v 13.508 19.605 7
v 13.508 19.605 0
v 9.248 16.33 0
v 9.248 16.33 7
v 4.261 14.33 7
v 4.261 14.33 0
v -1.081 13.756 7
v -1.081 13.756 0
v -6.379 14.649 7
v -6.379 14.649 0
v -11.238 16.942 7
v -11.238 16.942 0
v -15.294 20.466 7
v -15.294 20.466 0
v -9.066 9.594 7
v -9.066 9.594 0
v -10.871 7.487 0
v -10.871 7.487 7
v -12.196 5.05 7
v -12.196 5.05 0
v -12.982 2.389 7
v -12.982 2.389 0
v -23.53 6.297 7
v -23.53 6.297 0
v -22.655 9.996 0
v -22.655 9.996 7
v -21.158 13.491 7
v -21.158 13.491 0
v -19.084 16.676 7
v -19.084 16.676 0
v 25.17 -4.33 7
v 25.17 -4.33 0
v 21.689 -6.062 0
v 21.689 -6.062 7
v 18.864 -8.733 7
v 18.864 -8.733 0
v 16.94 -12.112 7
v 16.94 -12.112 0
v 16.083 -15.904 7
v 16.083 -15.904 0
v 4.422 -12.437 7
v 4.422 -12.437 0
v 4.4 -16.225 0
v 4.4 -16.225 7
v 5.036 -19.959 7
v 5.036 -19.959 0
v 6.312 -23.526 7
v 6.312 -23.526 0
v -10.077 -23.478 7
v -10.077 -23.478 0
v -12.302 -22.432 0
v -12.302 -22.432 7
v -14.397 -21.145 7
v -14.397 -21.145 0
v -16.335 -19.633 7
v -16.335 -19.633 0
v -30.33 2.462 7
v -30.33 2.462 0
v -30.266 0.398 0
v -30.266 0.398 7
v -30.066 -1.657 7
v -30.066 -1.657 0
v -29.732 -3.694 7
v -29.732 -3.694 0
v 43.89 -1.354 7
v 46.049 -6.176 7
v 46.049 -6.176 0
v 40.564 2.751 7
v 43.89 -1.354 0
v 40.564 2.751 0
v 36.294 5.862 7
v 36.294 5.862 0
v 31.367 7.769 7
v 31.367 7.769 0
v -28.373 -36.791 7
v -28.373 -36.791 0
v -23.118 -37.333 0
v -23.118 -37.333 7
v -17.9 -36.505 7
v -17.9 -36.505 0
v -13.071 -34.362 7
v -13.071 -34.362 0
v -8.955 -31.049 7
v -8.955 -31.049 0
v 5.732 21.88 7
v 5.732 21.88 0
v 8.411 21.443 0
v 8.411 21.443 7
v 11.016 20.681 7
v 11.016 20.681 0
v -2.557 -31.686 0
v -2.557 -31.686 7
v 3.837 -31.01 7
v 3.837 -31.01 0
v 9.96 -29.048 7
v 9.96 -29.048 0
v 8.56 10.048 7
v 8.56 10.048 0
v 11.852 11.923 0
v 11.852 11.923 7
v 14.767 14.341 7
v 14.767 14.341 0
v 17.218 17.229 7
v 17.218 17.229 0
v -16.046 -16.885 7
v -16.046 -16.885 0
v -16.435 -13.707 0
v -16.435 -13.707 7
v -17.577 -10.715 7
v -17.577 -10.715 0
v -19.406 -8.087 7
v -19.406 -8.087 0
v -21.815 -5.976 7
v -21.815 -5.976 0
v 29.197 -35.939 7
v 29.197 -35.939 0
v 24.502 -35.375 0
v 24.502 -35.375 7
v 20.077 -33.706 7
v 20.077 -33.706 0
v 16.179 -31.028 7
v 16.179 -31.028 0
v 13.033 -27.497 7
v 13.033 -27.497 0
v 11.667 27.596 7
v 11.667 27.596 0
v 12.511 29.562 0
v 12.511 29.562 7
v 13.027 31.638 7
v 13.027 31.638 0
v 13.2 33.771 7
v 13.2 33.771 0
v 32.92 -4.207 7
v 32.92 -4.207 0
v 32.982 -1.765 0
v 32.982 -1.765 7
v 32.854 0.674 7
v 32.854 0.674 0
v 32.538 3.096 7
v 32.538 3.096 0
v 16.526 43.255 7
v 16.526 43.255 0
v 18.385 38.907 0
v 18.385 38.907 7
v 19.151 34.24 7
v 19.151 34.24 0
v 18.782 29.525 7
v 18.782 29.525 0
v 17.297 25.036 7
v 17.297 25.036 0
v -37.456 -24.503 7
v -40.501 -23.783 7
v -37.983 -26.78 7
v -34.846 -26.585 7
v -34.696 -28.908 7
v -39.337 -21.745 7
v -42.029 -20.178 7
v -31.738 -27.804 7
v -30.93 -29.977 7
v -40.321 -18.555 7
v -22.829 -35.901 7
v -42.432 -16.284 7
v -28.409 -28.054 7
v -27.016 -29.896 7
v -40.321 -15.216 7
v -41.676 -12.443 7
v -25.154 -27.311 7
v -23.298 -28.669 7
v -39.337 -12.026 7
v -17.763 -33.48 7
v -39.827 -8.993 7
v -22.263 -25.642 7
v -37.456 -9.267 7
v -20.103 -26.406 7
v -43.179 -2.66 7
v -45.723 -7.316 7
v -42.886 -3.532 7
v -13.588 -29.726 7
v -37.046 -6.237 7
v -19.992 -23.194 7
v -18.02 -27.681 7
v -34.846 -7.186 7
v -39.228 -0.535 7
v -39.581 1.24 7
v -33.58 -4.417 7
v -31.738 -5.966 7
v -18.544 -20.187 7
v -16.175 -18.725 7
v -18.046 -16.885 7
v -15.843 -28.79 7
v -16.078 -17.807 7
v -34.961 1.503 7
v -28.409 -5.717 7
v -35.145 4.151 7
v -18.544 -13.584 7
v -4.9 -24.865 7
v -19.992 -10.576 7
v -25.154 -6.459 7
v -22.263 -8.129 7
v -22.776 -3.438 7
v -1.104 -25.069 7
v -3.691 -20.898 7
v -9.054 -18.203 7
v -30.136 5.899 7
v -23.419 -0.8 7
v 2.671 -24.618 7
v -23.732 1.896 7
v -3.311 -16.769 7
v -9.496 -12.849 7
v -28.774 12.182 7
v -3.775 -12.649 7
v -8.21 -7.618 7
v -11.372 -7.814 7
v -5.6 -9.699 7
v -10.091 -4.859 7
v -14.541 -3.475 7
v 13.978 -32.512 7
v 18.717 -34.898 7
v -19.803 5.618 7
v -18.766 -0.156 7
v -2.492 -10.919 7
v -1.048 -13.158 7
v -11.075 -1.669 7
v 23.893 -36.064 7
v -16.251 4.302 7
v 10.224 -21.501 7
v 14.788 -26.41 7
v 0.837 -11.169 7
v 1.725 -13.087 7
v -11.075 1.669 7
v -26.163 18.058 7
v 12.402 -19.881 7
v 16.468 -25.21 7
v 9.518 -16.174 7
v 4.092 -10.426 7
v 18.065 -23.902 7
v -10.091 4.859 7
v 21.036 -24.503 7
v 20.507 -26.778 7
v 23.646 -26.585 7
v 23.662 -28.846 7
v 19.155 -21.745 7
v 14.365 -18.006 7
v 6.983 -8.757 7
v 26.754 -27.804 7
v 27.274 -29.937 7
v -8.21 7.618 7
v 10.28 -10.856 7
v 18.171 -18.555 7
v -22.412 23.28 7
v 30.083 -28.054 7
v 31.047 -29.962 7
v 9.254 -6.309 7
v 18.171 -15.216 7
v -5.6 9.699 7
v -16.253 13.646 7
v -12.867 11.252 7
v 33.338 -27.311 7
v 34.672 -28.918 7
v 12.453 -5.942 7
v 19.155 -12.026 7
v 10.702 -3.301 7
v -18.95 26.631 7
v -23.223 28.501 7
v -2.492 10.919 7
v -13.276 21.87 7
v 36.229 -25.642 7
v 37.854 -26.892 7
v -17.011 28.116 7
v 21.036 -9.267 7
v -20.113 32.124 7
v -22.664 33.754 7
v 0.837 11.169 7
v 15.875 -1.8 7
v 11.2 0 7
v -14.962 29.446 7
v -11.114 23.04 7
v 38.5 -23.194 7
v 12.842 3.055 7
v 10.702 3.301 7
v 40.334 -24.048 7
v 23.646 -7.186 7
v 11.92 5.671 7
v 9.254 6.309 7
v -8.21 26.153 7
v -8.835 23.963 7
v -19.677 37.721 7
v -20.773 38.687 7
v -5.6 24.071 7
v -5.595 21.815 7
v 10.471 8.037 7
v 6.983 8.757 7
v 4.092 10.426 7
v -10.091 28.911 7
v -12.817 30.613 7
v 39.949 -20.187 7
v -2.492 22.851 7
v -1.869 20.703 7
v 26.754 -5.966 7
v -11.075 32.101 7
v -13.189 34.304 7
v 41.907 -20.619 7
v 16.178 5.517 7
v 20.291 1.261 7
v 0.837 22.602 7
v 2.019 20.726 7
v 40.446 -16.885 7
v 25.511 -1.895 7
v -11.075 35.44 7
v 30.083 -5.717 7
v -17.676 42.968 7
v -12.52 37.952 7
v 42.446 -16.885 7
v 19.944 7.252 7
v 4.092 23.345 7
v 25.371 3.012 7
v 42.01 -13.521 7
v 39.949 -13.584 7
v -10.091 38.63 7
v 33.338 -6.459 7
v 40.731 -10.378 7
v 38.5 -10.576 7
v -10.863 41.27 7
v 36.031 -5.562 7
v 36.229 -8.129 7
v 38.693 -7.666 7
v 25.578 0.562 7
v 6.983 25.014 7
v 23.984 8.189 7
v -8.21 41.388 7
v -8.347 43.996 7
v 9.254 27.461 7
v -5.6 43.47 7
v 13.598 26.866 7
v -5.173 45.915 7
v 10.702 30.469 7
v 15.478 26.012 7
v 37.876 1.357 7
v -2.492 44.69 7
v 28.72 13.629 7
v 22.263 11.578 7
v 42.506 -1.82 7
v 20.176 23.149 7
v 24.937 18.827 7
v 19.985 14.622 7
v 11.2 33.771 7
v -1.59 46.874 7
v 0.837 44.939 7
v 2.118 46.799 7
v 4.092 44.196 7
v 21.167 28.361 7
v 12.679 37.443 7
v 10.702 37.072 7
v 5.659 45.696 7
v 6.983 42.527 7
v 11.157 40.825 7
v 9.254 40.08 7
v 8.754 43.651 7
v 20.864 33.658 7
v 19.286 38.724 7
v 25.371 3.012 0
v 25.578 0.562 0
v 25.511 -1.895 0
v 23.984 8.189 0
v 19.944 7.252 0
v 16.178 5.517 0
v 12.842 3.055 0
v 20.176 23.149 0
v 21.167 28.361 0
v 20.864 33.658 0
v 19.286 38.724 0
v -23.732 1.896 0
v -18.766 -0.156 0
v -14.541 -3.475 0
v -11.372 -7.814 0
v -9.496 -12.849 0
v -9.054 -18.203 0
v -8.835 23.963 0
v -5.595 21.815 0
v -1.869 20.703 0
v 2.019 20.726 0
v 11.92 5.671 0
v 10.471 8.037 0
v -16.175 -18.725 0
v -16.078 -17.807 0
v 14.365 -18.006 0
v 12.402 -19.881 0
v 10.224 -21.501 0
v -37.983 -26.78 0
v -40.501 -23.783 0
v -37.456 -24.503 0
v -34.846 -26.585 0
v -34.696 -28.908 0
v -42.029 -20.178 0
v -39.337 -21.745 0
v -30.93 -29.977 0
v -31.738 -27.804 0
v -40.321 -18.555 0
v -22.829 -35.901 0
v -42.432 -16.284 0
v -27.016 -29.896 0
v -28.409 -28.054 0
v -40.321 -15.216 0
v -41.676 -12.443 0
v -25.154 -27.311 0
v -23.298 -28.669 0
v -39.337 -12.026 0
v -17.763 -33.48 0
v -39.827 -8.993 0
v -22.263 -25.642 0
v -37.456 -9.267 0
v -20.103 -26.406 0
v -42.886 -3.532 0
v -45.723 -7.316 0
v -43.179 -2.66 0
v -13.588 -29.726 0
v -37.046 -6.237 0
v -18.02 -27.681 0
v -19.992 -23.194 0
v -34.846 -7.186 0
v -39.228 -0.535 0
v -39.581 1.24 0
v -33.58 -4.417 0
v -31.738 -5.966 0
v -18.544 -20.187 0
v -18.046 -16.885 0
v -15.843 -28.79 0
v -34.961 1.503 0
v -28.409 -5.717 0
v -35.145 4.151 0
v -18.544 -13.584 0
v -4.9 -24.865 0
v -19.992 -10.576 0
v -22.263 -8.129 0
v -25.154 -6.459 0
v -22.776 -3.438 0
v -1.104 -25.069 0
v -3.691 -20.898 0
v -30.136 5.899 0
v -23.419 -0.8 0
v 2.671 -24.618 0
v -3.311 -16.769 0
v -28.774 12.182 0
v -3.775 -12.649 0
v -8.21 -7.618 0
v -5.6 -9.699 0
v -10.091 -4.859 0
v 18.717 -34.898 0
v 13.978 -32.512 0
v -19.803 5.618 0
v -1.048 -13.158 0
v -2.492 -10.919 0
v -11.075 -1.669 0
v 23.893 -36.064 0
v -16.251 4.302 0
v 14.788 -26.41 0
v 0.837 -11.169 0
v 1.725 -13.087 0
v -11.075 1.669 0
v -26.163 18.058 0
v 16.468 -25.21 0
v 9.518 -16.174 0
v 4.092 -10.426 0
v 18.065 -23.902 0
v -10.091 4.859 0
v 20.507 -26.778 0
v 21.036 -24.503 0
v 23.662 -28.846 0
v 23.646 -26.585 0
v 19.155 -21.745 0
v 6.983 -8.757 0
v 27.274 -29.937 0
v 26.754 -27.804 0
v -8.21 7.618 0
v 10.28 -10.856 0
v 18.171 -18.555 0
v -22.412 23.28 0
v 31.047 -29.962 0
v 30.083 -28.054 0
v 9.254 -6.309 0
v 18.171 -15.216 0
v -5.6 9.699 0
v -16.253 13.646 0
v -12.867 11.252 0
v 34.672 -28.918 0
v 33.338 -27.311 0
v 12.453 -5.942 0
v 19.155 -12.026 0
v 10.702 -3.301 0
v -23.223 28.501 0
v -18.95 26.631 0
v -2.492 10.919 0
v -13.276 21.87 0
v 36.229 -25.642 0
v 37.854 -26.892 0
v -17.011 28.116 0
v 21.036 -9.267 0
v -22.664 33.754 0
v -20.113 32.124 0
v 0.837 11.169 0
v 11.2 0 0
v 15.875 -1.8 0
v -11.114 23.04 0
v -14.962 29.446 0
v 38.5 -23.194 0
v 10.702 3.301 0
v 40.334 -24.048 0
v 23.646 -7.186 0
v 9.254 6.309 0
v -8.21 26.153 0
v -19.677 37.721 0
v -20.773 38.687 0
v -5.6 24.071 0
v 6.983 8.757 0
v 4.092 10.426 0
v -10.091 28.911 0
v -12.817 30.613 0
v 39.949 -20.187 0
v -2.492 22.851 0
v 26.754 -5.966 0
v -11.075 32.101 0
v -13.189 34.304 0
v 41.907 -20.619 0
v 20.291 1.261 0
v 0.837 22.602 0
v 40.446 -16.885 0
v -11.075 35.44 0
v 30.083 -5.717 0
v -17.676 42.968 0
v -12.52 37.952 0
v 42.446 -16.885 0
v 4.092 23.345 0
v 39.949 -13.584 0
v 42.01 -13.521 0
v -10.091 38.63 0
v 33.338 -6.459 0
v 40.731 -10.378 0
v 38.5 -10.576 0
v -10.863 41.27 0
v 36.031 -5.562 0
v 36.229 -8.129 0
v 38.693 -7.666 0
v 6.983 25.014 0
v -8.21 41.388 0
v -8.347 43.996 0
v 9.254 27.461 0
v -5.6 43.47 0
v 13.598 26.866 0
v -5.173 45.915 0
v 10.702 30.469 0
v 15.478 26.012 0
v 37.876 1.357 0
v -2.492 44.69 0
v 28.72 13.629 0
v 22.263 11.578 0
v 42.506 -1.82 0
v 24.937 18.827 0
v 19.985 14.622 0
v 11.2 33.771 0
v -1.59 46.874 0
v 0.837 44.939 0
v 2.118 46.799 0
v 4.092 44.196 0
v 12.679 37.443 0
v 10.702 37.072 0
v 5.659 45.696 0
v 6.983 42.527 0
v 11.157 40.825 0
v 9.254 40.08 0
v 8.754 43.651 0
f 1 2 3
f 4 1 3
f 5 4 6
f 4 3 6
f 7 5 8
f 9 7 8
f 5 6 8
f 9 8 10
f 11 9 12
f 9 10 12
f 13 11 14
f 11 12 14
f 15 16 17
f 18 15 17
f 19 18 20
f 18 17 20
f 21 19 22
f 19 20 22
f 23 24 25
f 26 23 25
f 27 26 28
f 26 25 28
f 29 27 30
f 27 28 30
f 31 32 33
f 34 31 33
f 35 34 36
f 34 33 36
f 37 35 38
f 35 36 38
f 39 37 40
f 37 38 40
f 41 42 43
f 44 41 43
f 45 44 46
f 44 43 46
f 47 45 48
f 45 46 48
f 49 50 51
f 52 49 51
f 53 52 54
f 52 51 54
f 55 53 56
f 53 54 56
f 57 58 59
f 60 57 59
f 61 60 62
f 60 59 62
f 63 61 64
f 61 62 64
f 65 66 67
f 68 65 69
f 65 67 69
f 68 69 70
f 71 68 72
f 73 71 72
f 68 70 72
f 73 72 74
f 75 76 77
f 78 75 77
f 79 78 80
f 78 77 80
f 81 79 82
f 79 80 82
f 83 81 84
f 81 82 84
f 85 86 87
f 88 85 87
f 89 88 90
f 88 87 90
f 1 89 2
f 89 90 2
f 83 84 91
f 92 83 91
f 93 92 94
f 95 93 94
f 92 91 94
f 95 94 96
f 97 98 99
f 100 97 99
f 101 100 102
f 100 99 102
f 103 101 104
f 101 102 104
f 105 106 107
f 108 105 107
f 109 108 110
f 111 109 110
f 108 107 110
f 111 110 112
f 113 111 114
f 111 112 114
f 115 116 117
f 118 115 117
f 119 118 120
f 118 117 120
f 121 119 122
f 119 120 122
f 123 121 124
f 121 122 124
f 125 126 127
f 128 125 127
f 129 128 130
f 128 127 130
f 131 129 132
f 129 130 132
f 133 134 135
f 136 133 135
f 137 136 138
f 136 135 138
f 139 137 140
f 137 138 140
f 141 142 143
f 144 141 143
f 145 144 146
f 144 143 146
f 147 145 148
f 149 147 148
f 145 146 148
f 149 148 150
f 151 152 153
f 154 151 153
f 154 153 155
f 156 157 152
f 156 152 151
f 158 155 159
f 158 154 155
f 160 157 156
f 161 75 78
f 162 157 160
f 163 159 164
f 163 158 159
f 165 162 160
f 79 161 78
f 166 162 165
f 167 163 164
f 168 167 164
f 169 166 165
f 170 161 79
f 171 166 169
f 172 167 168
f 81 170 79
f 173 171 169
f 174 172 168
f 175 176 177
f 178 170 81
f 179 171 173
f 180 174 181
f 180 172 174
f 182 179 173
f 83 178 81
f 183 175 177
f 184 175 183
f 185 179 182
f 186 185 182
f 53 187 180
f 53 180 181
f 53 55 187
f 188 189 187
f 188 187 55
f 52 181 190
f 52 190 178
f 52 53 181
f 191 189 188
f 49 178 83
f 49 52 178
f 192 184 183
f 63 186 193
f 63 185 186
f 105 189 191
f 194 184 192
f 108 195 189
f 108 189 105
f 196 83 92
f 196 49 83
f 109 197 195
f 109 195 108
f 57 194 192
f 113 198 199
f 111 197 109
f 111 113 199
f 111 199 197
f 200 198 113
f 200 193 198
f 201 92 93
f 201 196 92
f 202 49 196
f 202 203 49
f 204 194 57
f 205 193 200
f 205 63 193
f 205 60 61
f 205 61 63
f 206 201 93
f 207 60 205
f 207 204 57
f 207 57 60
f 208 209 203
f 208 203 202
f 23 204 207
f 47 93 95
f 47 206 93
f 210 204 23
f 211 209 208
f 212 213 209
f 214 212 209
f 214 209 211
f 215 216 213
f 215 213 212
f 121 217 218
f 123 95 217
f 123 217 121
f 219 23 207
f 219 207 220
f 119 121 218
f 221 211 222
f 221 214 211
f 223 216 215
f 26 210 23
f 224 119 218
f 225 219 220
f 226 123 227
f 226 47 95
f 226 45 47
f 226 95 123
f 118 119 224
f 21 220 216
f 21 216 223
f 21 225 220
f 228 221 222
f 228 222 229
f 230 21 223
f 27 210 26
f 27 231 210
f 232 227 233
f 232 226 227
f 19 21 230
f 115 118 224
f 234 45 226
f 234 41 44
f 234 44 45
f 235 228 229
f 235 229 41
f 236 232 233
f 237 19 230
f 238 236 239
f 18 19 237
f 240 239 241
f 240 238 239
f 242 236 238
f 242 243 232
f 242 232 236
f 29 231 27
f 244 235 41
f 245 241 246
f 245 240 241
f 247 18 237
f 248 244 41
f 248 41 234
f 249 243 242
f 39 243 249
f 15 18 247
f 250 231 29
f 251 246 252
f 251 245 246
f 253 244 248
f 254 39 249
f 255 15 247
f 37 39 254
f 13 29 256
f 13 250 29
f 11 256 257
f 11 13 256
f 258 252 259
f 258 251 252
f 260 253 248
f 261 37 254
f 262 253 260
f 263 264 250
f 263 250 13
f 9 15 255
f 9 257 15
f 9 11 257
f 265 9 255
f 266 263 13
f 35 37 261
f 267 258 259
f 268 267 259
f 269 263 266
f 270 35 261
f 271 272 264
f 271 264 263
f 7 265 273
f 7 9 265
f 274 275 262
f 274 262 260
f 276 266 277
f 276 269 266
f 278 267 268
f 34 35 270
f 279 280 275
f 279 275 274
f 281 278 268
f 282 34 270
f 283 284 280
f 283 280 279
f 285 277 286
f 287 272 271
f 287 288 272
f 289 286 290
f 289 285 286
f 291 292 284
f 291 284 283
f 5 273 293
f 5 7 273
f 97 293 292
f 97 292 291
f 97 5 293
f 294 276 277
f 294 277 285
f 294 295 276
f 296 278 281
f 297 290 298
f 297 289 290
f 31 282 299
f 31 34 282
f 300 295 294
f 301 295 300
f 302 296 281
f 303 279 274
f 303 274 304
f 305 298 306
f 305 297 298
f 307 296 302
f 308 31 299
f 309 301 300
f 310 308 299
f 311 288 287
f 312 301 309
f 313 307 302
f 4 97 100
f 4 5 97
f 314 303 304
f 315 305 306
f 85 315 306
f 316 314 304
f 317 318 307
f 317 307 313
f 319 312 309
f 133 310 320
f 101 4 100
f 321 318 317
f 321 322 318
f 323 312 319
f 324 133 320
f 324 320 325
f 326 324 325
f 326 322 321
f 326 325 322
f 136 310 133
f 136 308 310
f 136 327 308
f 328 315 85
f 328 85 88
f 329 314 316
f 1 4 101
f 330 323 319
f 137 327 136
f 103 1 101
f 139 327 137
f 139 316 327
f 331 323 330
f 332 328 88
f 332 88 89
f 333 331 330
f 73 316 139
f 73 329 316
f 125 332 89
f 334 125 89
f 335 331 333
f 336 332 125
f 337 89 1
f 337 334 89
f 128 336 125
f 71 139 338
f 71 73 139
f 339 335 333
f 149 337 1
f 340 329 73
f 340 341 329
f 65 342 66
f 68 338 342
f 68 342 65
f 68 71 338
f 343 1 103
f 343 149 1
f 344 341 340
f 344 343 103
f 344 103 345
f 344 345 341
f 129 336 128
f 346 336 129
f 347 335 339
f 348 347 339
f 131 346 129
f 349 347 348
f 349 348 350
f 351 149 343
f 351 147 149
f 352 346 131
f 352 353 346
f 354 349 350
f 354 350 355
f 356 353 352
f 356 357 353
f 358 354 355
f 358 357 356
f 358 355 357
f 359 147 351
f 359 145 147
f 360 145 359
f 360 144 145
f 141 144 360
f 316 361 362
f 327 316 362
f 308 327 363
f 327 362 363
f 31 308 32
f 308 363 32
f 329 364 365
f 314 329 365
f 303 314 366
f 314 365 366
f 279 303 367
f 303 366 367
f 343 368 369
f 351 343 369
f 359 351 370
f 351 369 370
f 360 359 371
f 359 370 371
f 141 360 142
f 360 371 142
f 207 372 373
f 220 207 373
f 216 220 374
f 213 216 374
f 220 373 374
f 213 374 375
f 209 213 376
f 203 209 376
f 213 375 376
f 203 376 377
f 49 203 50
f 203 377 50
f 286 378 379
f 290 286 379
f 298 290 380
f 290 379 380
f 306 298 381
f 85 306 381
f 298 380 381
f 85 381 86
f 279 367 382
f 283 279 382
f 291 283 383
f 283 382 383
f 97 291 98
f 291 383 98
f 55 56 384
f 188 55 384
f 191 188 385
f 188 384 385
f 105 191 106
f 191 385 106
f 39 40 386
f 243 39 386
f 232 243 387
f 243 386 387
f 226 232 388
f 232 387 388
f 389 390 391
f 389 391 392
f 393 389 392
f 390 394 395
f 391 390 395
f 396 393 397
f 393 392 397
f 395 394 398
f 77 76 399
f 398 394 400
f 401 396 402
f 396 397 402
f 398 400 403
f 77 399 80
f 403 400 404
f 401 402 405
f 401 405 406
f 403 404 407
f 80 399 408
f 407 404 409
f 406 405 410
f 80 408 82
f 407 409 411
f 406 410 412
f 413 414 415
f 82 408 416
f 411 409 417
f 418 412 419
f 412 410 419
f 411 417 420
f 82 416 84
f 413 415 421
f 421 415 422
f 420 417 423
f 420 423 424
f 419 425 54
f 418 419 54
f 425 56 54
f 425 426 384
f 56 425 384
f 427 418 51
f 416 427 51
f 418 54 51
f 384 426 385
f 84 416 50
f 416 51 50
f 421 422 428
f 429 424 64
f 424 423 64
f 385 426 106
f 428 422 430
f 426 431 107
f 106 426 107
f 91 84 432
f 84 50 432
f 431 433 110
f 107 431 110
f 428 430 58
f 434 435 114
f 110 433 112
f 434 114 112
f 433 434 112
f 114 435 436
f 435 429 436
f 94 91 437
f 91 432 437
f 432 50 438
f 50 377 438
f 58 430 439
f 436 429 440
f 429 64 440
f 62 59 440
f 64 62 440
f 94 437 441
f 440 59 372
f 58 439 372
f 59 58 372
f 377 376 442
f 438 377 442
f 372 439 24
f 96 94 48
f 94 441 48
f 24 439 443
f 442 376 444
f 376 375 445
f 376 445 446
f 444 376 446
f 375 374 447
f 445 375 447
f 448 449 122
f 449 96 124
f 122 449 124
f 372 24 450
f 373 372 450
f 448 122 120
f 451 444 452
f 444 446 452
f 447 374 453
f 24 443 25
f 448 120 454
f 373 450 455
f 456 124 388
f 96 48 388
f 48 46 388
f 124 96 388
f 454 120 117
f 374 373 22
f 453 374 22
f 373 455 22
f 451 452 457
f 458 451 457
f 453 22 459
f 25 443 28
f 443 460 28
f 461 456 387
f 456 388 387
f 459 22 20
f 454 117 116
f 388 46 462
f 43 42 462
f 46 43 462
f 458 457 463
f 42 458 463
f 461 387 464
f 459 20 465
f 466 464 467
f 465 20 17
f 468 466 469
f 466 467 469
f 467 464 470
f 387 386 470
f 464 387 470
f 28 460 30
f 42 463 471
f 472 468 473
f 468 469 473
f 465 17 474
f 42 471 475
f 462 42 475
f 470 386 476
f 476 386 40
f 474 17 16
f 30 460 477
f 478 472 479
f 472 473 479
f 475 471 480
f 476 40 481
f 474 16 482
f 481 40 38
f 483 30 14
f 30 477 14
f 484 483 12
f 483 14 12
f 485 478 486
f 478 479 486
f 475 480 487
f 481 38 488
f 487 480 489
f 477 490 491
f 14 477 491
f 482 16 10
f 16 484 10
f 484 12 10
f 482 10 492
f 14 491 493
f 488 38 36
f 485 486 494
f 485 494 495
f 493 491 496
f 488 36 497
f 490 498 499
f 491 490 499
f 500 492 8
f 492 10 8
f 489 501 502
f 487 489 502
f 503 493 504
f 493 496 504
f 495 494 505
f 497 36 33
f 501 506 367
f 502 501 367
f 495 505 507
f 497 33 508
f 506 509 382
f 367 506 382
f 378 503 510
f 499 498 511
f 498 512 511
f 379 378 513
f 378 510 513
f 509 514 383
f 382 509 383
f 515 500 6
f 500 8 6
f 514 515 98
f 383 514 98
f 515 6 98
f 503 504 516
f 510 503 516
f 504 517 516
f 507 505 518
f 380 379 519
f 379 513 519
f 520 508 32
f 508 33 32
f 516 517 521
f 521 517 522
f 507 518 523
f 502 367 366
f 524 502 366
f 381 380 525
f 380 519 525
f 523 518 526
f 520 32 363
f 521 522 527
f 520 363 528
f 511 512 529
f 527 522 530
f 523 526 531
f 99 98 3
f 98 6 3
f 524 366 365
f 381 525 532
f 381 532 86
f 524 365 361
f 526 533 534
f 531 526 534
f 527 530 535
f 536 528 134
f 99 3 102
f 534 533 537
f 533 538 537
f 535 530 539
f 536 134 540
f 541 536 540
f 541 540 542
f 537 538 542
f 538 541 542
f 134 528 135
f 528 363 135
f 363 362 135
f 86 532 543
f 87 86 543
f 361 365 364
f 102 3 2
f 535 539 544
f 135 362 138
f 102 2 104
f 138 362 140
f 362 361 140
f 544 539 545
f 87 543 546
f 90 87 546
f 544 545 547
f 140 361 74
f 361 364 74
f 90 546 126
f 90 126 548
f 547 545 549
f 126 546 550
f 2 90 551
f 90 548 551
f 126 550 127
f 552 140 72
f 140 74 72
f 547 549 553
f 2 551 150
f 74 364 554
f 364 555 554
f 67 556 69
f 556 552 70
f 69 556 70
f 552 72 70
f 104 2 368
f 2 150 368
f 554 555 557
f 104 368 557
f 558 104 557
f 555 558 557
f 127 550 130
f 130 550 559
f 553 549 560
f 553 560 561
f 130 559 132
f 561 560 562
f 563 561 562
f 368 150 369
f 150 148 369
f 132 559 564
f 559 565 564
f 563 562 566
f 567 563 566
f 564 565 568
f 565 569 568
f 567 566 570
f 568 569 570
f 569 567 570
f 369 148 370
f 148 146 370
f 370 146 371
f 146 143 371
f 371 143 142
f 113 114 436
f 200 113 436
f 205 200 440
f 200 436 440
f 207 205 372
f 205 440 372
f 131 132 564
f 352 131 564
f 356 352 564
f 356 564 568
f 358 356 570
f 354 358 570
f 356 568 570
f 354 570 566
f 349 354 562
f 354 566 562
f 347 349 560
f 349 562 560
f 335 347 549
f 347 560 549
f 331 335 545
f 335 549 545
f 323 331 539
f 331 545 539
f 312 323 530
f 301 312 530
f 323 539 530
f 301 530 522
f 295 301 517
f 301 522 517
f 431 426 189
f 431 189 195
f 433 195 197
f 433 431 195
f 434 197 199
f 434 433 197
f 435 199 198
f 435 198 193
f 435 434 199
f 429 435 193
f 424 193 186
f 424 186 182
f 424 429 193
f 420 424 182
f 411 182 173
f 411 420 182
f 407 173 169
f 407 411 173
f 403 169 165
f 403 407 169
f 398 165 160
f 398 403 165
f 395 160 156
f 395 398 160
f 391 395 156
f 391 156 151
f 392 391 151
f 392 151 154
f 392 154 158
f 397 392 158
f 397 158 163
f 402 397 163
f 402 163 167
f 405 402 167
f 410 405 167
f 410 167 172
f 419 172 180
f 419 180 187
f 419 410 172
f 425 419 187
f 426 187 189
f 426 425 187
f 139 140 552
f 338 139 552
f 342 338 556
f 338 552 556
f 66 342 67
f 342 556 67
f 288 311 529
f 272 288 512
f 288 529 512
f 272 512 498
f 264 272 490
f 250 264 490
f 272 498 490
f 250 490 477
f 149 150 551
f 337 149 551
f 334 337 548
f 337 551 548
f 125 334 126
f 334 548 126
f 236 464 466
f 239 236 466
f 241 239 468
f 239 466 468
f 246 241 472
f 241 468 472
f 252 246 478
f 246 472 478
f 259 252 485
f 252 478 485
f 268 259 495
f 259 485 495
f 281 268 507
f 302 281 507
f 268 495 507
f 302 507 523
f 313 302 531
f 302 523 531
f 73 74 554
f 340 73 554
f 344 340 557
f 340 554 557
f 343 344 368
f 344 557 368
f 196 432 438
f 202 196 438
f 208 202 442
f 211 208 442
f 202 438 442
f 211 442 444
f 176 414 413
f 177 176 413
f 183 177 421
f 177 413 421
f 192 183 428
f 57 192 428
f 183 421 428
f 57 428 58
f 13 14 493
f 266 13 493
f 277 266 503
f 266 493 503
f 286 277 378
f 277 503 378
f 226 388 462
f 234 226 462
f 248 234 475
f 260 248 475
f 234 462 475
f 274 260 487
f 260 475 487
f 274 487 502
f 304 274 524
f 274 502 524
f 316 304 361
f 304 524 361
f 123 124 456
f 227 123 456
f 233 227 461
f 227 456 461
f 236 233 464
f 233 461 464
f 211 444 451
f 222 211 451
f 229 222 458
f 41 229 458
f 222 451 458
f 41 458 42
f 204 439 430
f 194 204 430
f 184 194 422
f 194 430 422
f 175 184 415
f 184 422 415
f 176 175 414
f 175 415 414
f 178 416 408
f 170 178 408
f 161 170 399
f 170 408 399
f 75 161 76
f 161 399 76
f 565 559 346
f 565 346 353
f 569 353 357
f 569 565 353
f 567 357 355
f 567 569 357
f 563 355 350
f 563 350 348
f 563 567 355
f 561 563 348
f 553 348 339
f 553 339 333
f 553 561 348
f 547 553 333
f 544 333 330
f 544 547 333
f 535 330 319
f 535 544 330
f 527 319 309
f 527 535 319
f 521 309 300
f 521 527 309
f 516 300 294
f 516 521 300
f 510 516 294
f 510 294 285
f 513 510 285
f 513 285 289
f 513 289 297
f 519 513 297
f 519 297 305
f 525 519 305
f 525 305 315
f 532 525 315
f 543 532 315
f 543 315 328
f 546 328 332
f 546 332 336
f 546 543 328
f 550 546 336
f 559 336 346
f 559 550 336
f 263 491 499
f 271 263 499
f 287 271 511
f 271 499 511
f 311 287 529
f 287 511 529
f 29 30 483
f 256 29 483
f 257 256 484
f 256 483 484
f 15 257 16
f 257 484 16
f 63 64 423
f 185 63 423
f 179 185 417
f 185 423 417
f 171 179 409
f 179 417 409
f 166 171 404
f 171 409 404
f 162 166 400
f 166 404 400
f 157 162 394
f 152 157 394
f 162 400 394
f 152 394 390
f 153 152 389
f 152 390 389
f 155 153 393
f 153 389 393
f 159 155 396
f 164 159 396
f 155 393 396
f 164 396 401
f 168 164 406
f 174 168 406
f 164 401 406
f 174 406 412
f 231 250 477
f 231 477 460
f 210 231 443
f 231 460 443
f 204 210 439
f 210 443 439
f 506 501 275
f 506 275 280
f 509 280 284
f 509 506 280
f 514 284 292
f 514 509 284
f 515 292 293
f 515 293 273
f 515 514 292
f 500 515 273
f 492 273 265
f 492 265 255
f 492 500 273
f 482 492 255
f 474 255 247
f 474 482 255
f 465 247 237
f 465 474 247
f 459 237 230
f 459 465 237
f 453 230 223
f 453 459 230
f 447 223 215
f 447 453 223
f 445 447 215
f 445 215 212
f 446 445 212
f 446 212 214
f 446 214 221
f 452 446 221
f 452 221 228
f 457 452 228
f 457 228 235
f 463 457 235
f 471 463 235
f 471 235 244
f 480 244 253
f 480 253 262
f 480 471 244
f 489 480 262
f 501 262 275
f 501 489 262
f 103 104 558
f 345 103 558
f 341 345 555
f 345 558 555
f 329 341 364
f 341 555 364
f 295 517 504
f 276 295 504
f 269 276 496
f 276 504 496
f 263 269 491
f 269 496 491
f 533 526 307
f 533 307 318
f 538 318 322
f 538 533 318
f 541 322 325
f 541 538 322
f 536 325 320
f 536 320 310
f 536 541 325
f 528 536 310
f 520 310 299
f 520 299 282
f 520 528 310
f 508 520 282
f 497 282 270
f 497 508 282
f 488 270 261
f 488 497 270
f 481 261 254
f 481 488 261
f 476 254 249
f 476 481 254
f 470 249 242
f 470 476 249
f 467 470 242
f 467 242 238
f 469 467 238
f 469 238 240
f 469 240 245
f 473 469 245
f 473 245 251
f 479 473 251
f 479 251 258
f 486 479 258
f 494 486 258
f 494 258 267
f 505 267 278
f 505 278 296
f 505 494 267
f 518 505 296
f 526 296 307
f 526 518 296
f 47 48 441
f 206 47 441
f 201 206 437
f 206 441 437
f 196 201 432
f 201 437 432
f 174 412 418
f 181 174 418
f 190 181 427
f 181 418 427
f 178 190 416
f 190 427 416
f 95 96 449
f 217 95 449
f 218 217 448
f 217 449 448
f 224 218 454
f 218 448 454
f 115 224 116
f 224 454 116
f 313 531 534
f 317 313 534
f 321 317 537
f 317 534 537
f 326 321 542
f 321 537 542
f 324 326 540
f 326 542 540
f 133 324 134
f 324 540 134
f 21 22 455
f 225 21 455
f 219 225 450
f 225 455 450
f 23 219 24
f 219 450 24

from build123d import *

# Parameters (mm, degrees)
F0_R     = 11.2
F1_DEPTH = 7


with BuildPart() as f1:
    # F0 (on Top) → F1 (new body)
    with BuildSketch(Plane.XY):
        with BuildLine():
            ThreePointArc((-9.0664544139, 9.593716921), (-0.3402026464, 13.1956152626), (8.5600576622, 10.0481546973))
            ThreePointArc((8.5600576622, 10.0481546973), (13.3623688649, 13.0682272047), (17.2184018315, 17.229241576))
            ThreePointArc((17.2184018315, 17.229241576), (15.4226648447, 18.5097823264), (13.5080117048, 19.6045696542))
            ThreePointArc((13.5080117048, 19.6045696542), (-1.0807969762, 13.7556794158), (-15.2941767487, 20.4655744367))
            ThreePointArc((-15.2941767487, 20.4655744367), (-17.3044688505, 18.6863680779), (-19.0837069005, 16.676104025))
            ThreePointArc((-19.0837069005, 16.676104025), (-14.6210833504, 12.36265011), (-9.0664544139, 9.593716921))
        make_face()
        with BuildLine():
            ThreePointArc((12.8416297773, 3.0549213841), (13.1101013165, 1.5379348068), (13.2, 0))
            ThreePointArc((13.2, 0), (10.7844669514, -7.6115223559), (4.4219283979, -12.4373047419))
            ThreePointArc((4.4219283979, -12.4373047419), (4.6362323092, -18.1062644941), (6.311759977, -23.5261941867))
            ThreePointArc((6.311759977, -23.5261941867), (8.3186092908, -22.6113107128), (10.2240494984, -21.5005661181))
            ThreePointArc((10.2240494984, -21.5005661181), (12.4531663085, -5.9418420702), (25.3707957396, 3.012358376))
            ThreePointArc((25.3707957396, 3.012358376), (24.8351038852, 5.6429255846), (23.983783172, 8.1889229618))
            ThreePointArc((23.983783172, 8.1889229618), (18.0169107285, 6.4809045573), (12.8416297773, 3.0549213841))
        make_face()
        with BuildLine():
            ThreePointArc((-4.9000762715, -24.8650269867), (-3.3958273782, -18.8435546673), (-3.7751753634, -12.6486383052))
            ThreePointArc((-3.7751753634, -12.6486383052), (-11.2576367128, -6.8924317656), (-12.9819860601, 2.3891500447))
            ThreePointArc((-12.9819860601, 2.3891500447), (-17.9986011741, 5.0380372894), (-23.5301618085, 6.2969526107))
            ThreePointArc((-23.5301618085, 6.2969526107), (-23.7412741356, 4.1015283864), (-23.7320612032, 1.8959964639))
            ThreePointArc((-23.7320612032, 1.8959964639), (-11.3723693323, -7.8138373456), (-10.0766189909, -23.4779328127))
            ThreePointArc((-10.0766189909, -23.4779328127), (-7.5306350347, -24.3292936625), (-4.9000762715, -24.8650269867))
        make_face()
        with BuildLine():
            ThreePointArc((4.4219283979, -12.4373047419), (10.7844669514, -7.6115223559), (13.2, 0))
            ThreePointArc((13.2, 0), (13.1101013165, 1.5379348068), (12.8416297773, 3.0549213841))
            ThreePointArc((12.8416297773, 3.0549213841), (11.2576367128, 6.8924317656), (8.5600576622, 10.0481546973))
            ThreePointArc((8.5600576622, 10.0481546973), (-0.3402026464, 13.1956152626), (-9.0664544139, 9.593716921))
            ThreePointArc((-9.0664544139, 9.593716921), (-11.5978393592, 6.3031834971), (-12.9819860601, 2.3891500447))
            ThreePointArc((-12.9819860601, 2.3891500447), (-11.2576367128, -6.8924317656), (-3.7751753634, -12.6486383052))
            ThreePointArc((-3.7751753634, -12.6486383052), (0.3402026464, -13.1956152626), (4.4219283979, -12.4373047419))
        make_face()
        Circle(F0_R, mode=Mode.SUBTRACT)
        with BuildLine():
            ThreePointArc((32.9202071932, -4.2068897734), (29.0359709967, -3.6869389282), (25.1702590813, -4.330298158))
            ThreePointArc((25.1702590813, -4.330298158), (18.8640994661, -8.7333779701), (16.0826587078, -15.9040368123))
            ThreePointArc((16.0826587078, -15.9040368123), (16.4340128371, -20.0616545549), (18.0654938023, -23.9019025779))
            ThreePointArc((18.0654938023, -23.9019025779), (32.8968568839, -29.5703850374), (42.4461381055, -16.885265708))
            ThreePointArc((42.4461381055, -16.885265708), (39.79928247, -8.9561330933), (32.9202071932, -4.2068897734))
        make_face()
        with Locations((29.2461381055, -16.885265708)):
            Circle(F0_R, mode=Mode.SUBTRACT)
        with BuildLine():
            ThreePointArc((-20.1033770112, -26.4062908404), (-17.7109682723, -23.3024190426), (-16.3352777515, -19.6329347052))
            ThreePointArc((-16.3352777515, -19.6329347052), (-16.1186220291, -18.2666858697), (-16.0461381055, -16.885265708))
            ThreePointArc((-16.0461381055, -16.885265708), (-17.5770353805, -10.715011127), (-21.8146292561, -5.9759725952))
            ThreePointArc((-21.8146292561, -5.9759725952), (-25.5909089051, -4.2014453256), (-29.7324017324, -3.6942252757))
            ThreePointArc((-29.7324017324, -3.6942252757), (-41.3990479486, -22.0376226779), (-20.1033770112, -26.4062908404))
        make_face()
        with Locations((-29.2461381055, -16.885265708)):
            Circle(F0_R, mode=Mode.SUBTRACT)
        with BuildLine():
            ThreePointArc((-8.8349813298, 23.9632328632), (-1.8687225501, 20.7034783422), (5.7319705483, 21.8800094075))
            ThreePointArc((5.7319705483, 21.8800094075), (9.156896068, 24.2630998805), (11.6669079301, 27.5961278537))
            ThreePointArc((11.6669079301, 27.5961278537), (12.8109949785, 30.5895869554), (13.2, 33.7705314159))
            ThreePointArc((13.2, 33.7705314159), (-1.590258092, 46.8743888328), (-12.8168301819, 30.6131806138))
            ThreePointArc((-12.8168301819, 30.6131806138), (-11.3250027243, 26.9893579708), (-8.8349813298, 23.9632328632))
        make_face()
        with Locations((0, 33.7705314159)):
            Circle(F0_R, mode=Mode.SUBTRACT)
        with BuildLine():
            ThreePointArc((17.2184018315, 17.229241576), (21.1894312467, 13.1493694022), (23.983783172, 8.1889229618))
            ThreePointArc((23.983783172, 8.1889229618), (27.6947359518, 8.3170744376), (31.3672708376, 7.769278082))
            ThreePointArc((31.3672708376, 7.769278082), (26.9615371909, 16.3249034182), (20.1761751997, 23.1489840527))
            ThreePointArc((20.1761751997, 23.1489840527), (18.9241495267, 20.0757627051), (17.2184018315, 17.229241576))
        make_face()
        with BuildLine():
            ThreePointArc((5.7319705483, 21.8800094075), (9.725374259, 21.102423687), (13.5080117048, 19.6045696542))
            ThreePointArc((13.5080117048, 19.6045696542), (15.6326468091, 22.1594171164), (17.2967238329, 25.0355547244))
            ThreePointArc((17.2967238329, 25.0355547244), (14.5448752652, 26.4544870934), (11.6669079301, 27.5961278537))
            ThreePointArc((11.6669079301, 27.5961278537), (9.156896068, 24.2630998805), (5.7319705483, 21.8800094075))
        make_face()
        with BuildLine():
            ThreePointArc((13.5080117048, 19.6045696542), (15.4226648447, 18.5097823264), (17.2184018315, 17.229241576))
            ThreePointArc((17.2184018315, 17.229241576), (18.9241495267, 20.0757627051), (20.1761751997, 23.1489840527))
            ThreePointArc((20.1761751997, 23.1489840527), (18.7622662534, 24.1316731809), (17.2967238329, 25.0355547244))
            ThreePointArc((17.2967238329, 25.0355547244), (15.6326468091, 22.1594171164), (13.5080117048, 19.6045696542))
        make_face()
        with BuildLine():
            ThreePointArc((31.3672708376, 7.769278082), (27.6947359518, 8.3170744376), (23.983783172, 8.1889229618))
            ThreePointArc((23.983783172, 8.1889229618), (24.8351038852, 5.6429255846), (25.3707957396, 3.012358376))
            ThreePointArc((25.3707957396, 3.012358376), (28.9504210038, 3.3834783518), (32.5377278794, 3.0959432247))
            ThreePointArc((32.5377278794, 3.0959432247), (32.0420645208, 5.4550426378), (31.3672708376, 7.769278082))
        make_face()
        with BuildLine():
            ThreePointArc((32.5377278794, 3.0959432247), (28.9504210038, 3.3834783518), (25.3707957396, 3.012358376))
            ThreePointArc((25.3707957396, 3.012358376), (25.5783549003, -0.6673770248), (25.1702590813, -4.330298158))
            ThreePointArc((25.1702590813, -4.330298158), (29.0359709967, -3.6869389282), (32.9202071932, -4.2068897734))
            ThreePointArc((32.9202071932, -4.2068897734), (32.9418244088, -0.544325087), (32.5377278794, 3.0959432247))
        make_face()
        with BuildLine():
            ThreePointArc((46.0488609523, -6.1762533223), (40.5642006941, 2.7506157789), (31.3672708376, 7.769278082))
            ThreePointArc((31.3672708376, 7.769278082), (32.0420645208, 5.4550426378), (32.5377278794, 3.0959432247))
            ThreePointArc((32.5377278794, 3.0959432247), (40.3052666152, -0.0655431828), (46.0488609523, -6.1762533223))
        make_face()
        with BuildLine():
            ThreePointArc((17.2967238329, 25.0355547244), (18.7622662534, 24.1316731809), (20.1761751997, 23.1489840527))
            ThreePointArc((20.1761751997, 23.1489840527), (20.8643696401, 33.6582779676), (16.5260042995, 43.255019933))
            ThreePointArc((16.5260042995, 43.255019933), (19.1512826404, 34.2400403293), (17.2967238329, 25.0355547244))
        make_face()
        with BuildLine():
            ThreePointArc((-22.4120276069, 23.2802143517), (-21.0501657241, 19.8258076666), (-19.0837069005, 16.676104025))
            ThreePointArc((-19.0837069005, 16.676104025), (-17.3044688505, 18.6863680779), (-15.2941767487, 20.4655744367))
            ThreePointArc((-15.2941767487, 20.4655744367), (-17.4053887077, 23.3800608637), (-18.9500294209, 26.6305273126))
            ThreePointArc((-18.9500294209, 26.6305273126), (-20.7452377635, 25.0217205458), (-22.4120276069, 23.2802143517))
        make_face()
        with BuildLine():
            ThreePointArc((-18.9500294209, 26.6305273126), (-17.4053887077, 23.3800608637), (-15.2941767487, 20.4655744367))
            ThreePointArc((-15.2941767487, 20.4655744367), (-12.2112119927, 22.4851936431), (-8.8349813298, 23.9632328632))
            ThreePointArc((-8.8349813298, 23.9632328632), (-11.3250027243, 26.9893579708), (-12.8168301819, 30.6131806138))
            ThreePointArc((-12.8168301819, 30.6131806138), (-15.9995128512, 28.8006193285), (-18.9500294209, 26.6305273126))
        make_face()
        with BuildLine():
            ThreePointArc((-17.6756381989, 42.9676100612), (-22.6642034877, 33.7543203958), (-22.4120276069, 23.2802143517))
            ThreePointArc((-22.4120276069, 23.2802143517), (-20.7452377635, 25.0217205458), (-18.9500294209, 26.6305273126))
            ThreePointArc((-18.9500294209, 26.6305273126), (-20.0958712462, 34.9381563865), (-17.6756381989, 42.9676100612))
        make_face()
        with BuildLine():
            ThreePointArc((-23.5301618085, 6.2969526107), (-21.9824035694, 11.7759010503), (-19.0837069005, 16.676104025))
            ThreePointArc((-19.0837069005, 16.676104025), (-21.0501657241, 19.8258076666), (-22.4120276069, 23.2802143517))
            ThreePointArc((-22.4120276069, 23.2802143517), (-27.6185496699, 15.1869244233), (-30.1356958613, 5.8985882478))
            ThreePointArc((-30.1356958613, 5.8985882478), (-26.8481952663, 6.3509128826), (-23.5301618085, 6.2969526107))
        make_face()
        with BuildLine():
            ThreePointArc((-23.7320612032, 1.8959964639), (-23.7412741356, 4.1015283864), (-23.5301618085, 6.2969526107))
            ThreePointArc((-23.5301618085, 6.2969526107), (-26.8481952663, 6.3509128826), (-30.1356958613, 5.8985882478))
            ThreePointArc((-30.1356958613, 5.8985882478), (-30.2797751372, 4.1827626176), (-30.3297883056, 2.4616248793))
            ThreePointArc((-30.3297883056, 2.4616248793), (-27.0069415604, 2.4585607069), (-23.7320612032, 1.8959964639))
        make_face()
        with BuildLine():
            ThreePointArc((-30.3297883056, 2.4616248793), (-30.2797751372, 4.1827626176), (-30.1356958613, 5.8985882478))
            ThreePointArc((-30.1356958613, 5.8985882478), (-39.5811085877, 1.2399351585), (-45.7229482529, -7.3155704201))
            ThreePointArc((-45.7229482529, -7.3155704201), (-39.228386072, -0.534522883), (-30.3297883056, 2.4616248793))
        make_face()
        with BuildLine():
            ThreePointArc((-21.8146292561, -5.9759725952), (-23.1379221239, -2.1287906738), (-23.7320612032, 1.8959964639))
            ThreePointArc((-23.7320612032, 1.8959964639), (-27.0069415604, 2.4585607069), (-30.3297883056, 2.4616248793))
            ThreePointArc((-30.3297883056, 2.4616248793), (-30.1826954996, -0.6310120722), (-29.7324017324, -3.6942252757))
            ThreePointArc((-29.7324017324, -3.6942252757), (-25.5909089051, -4.2014453256), (-21.8146292561, -5.9759725952))
        make_face()
        with BuildLine():
            ThreePointArc((16.0826587078, -15.9040368123), (13.4125478648, -18.9736330131), (10.2240494984, -21.5005661181))
            ThreePointArc((10.2240494984, -21.5005661181), (11.3742947513, -24.6179778232), (13.0330644727, -27.4971796037))
            ThreePointArc((13.0330644727, -27.4971796037), (15.6378202344, -25.8234750212), (18.0654938023, -23.9019025779))
            ThreePointArc((18.0654938023, -23.9019025779), (16.4340128371, -20.0616545549), (16.0826587078, -15.9040368123))
        make_face()
        with BuildLine():
            ThreePointArc((10.2240494984, -21.5005661181), (8.3186092908, -22.6113107128), (6.311759977, -23.5261941867))
            ThreePointArc((6.311759977, -23.5261941867), (7.9240457396, -26.4266755877), (9.9595206616, -29.0475723005))
            ThreePointArc((9.9595206616, -29.0475723005), (11.5175088838, -28.3144357985), (13.0330644727, -27.4971796037))
            ThreePointArc((13.0330644727, -27.4971796037), (11.3742947513, -24.6179778232), (10.2240494984, -21.5005661181))
        make_face()
        with BuildLine():
            ThreePointArc((13.0330644727, -27.4971796037), (11.5175088838, -28.3144357985), (9.9595206616, -29.0475723005))
            ThreePointArc((9.9595206616, -29.0475723005), (18.7167389476, -34.8982131261), (29.1969439534, -35.9394495129))
            ThreePointArc((29.1969439534, -35.9394495129), (20.0771034316, -33.7055174463), (13.0330644727, -27.4971796037))
        make_face()
        with BuildLine():
            ThreePointArc((9.9595206616, -29.0475723005), (7.9240457396, -26.4266755877), (6.311759977, -23.5261941867))
            ThreePointArc((6.311759977, -23.5261941867), (0.7929723227, -24.9252704525), (-4.9000762715, -24.8650269867))
            ThreePointArc((-4.9000762715, -24.8650269867), (-6.6445702277, -28.1428821042), (-8.9552432307, -31.0494924337))
            ThreePointArc((-8.9552432307, -31.0494924337), (0.657012479, -31.5118278414), (9.9595206616, -29.0475723005))
        make_face()
        with BuildLine():
            ThreePointArc((-8.9552432307, -31.0494924337), (-6.6445702277, -28.1428821042), (-4.9000762715, -24.8650269867))
            ThreePointArc((-4.9000762715, -24.8650269867), (-7.5306350347, -24.3292936625), (-10.0766189909, -23.4779328127))
            ThreePointArc((-10.0766189909, -23.4779328127), (-11.5450322961, -26.7635392155), (-13.5876984584, -29.7264705373))
            ThreePointArc((-13.5876984584, -29.7264705373), (-11.2968267573, -30.4767631836), (-8.9552432307, -31.0494924337))
        make_face()
        with BuildLine():
            ThreePointArc((-13.5876984584, -29.7264705373), (-11.5450322961, -26.7635392155), (-10.0766189909, -23.4779328127))
            ThreePointArc((-10.0766189909, -23.4779328127), (-13.3671429076, -21.8178166183), (-16.3352777515, -19.6329347052))
            ThreePointArc((-16.3352777515, -19.6329347052), (-17.7109682723, -23.3024190426), (-20.1033770112, -26.4062908404))
            ThreePointArc((-20.1033770112, -26.4062908404), (-16.9423115576, -28.2562942415), (-13.5876984584, -29.7264705373))
        make_face()
        with BuildLine():
            ThreePointArc((-28.3732227534, -36.7913567389), (-17.8999972064, -36.5049361748), (-8.9552432307, -31.0494924337))
            ThreePointArc((-8.9552432307, -31.0494924337), (-11.2968267573, -30.4767631836), (-13.5876984584, -29.7264705373))
            ThreePointArc((-13.5876984584, -29.7264705373), (-20.209395369, -34.8726132037), (-28.3732227534, -36.7913567389))
        make_face()
    extrude(amount=F1_DEPTH)


solid = f1.part
